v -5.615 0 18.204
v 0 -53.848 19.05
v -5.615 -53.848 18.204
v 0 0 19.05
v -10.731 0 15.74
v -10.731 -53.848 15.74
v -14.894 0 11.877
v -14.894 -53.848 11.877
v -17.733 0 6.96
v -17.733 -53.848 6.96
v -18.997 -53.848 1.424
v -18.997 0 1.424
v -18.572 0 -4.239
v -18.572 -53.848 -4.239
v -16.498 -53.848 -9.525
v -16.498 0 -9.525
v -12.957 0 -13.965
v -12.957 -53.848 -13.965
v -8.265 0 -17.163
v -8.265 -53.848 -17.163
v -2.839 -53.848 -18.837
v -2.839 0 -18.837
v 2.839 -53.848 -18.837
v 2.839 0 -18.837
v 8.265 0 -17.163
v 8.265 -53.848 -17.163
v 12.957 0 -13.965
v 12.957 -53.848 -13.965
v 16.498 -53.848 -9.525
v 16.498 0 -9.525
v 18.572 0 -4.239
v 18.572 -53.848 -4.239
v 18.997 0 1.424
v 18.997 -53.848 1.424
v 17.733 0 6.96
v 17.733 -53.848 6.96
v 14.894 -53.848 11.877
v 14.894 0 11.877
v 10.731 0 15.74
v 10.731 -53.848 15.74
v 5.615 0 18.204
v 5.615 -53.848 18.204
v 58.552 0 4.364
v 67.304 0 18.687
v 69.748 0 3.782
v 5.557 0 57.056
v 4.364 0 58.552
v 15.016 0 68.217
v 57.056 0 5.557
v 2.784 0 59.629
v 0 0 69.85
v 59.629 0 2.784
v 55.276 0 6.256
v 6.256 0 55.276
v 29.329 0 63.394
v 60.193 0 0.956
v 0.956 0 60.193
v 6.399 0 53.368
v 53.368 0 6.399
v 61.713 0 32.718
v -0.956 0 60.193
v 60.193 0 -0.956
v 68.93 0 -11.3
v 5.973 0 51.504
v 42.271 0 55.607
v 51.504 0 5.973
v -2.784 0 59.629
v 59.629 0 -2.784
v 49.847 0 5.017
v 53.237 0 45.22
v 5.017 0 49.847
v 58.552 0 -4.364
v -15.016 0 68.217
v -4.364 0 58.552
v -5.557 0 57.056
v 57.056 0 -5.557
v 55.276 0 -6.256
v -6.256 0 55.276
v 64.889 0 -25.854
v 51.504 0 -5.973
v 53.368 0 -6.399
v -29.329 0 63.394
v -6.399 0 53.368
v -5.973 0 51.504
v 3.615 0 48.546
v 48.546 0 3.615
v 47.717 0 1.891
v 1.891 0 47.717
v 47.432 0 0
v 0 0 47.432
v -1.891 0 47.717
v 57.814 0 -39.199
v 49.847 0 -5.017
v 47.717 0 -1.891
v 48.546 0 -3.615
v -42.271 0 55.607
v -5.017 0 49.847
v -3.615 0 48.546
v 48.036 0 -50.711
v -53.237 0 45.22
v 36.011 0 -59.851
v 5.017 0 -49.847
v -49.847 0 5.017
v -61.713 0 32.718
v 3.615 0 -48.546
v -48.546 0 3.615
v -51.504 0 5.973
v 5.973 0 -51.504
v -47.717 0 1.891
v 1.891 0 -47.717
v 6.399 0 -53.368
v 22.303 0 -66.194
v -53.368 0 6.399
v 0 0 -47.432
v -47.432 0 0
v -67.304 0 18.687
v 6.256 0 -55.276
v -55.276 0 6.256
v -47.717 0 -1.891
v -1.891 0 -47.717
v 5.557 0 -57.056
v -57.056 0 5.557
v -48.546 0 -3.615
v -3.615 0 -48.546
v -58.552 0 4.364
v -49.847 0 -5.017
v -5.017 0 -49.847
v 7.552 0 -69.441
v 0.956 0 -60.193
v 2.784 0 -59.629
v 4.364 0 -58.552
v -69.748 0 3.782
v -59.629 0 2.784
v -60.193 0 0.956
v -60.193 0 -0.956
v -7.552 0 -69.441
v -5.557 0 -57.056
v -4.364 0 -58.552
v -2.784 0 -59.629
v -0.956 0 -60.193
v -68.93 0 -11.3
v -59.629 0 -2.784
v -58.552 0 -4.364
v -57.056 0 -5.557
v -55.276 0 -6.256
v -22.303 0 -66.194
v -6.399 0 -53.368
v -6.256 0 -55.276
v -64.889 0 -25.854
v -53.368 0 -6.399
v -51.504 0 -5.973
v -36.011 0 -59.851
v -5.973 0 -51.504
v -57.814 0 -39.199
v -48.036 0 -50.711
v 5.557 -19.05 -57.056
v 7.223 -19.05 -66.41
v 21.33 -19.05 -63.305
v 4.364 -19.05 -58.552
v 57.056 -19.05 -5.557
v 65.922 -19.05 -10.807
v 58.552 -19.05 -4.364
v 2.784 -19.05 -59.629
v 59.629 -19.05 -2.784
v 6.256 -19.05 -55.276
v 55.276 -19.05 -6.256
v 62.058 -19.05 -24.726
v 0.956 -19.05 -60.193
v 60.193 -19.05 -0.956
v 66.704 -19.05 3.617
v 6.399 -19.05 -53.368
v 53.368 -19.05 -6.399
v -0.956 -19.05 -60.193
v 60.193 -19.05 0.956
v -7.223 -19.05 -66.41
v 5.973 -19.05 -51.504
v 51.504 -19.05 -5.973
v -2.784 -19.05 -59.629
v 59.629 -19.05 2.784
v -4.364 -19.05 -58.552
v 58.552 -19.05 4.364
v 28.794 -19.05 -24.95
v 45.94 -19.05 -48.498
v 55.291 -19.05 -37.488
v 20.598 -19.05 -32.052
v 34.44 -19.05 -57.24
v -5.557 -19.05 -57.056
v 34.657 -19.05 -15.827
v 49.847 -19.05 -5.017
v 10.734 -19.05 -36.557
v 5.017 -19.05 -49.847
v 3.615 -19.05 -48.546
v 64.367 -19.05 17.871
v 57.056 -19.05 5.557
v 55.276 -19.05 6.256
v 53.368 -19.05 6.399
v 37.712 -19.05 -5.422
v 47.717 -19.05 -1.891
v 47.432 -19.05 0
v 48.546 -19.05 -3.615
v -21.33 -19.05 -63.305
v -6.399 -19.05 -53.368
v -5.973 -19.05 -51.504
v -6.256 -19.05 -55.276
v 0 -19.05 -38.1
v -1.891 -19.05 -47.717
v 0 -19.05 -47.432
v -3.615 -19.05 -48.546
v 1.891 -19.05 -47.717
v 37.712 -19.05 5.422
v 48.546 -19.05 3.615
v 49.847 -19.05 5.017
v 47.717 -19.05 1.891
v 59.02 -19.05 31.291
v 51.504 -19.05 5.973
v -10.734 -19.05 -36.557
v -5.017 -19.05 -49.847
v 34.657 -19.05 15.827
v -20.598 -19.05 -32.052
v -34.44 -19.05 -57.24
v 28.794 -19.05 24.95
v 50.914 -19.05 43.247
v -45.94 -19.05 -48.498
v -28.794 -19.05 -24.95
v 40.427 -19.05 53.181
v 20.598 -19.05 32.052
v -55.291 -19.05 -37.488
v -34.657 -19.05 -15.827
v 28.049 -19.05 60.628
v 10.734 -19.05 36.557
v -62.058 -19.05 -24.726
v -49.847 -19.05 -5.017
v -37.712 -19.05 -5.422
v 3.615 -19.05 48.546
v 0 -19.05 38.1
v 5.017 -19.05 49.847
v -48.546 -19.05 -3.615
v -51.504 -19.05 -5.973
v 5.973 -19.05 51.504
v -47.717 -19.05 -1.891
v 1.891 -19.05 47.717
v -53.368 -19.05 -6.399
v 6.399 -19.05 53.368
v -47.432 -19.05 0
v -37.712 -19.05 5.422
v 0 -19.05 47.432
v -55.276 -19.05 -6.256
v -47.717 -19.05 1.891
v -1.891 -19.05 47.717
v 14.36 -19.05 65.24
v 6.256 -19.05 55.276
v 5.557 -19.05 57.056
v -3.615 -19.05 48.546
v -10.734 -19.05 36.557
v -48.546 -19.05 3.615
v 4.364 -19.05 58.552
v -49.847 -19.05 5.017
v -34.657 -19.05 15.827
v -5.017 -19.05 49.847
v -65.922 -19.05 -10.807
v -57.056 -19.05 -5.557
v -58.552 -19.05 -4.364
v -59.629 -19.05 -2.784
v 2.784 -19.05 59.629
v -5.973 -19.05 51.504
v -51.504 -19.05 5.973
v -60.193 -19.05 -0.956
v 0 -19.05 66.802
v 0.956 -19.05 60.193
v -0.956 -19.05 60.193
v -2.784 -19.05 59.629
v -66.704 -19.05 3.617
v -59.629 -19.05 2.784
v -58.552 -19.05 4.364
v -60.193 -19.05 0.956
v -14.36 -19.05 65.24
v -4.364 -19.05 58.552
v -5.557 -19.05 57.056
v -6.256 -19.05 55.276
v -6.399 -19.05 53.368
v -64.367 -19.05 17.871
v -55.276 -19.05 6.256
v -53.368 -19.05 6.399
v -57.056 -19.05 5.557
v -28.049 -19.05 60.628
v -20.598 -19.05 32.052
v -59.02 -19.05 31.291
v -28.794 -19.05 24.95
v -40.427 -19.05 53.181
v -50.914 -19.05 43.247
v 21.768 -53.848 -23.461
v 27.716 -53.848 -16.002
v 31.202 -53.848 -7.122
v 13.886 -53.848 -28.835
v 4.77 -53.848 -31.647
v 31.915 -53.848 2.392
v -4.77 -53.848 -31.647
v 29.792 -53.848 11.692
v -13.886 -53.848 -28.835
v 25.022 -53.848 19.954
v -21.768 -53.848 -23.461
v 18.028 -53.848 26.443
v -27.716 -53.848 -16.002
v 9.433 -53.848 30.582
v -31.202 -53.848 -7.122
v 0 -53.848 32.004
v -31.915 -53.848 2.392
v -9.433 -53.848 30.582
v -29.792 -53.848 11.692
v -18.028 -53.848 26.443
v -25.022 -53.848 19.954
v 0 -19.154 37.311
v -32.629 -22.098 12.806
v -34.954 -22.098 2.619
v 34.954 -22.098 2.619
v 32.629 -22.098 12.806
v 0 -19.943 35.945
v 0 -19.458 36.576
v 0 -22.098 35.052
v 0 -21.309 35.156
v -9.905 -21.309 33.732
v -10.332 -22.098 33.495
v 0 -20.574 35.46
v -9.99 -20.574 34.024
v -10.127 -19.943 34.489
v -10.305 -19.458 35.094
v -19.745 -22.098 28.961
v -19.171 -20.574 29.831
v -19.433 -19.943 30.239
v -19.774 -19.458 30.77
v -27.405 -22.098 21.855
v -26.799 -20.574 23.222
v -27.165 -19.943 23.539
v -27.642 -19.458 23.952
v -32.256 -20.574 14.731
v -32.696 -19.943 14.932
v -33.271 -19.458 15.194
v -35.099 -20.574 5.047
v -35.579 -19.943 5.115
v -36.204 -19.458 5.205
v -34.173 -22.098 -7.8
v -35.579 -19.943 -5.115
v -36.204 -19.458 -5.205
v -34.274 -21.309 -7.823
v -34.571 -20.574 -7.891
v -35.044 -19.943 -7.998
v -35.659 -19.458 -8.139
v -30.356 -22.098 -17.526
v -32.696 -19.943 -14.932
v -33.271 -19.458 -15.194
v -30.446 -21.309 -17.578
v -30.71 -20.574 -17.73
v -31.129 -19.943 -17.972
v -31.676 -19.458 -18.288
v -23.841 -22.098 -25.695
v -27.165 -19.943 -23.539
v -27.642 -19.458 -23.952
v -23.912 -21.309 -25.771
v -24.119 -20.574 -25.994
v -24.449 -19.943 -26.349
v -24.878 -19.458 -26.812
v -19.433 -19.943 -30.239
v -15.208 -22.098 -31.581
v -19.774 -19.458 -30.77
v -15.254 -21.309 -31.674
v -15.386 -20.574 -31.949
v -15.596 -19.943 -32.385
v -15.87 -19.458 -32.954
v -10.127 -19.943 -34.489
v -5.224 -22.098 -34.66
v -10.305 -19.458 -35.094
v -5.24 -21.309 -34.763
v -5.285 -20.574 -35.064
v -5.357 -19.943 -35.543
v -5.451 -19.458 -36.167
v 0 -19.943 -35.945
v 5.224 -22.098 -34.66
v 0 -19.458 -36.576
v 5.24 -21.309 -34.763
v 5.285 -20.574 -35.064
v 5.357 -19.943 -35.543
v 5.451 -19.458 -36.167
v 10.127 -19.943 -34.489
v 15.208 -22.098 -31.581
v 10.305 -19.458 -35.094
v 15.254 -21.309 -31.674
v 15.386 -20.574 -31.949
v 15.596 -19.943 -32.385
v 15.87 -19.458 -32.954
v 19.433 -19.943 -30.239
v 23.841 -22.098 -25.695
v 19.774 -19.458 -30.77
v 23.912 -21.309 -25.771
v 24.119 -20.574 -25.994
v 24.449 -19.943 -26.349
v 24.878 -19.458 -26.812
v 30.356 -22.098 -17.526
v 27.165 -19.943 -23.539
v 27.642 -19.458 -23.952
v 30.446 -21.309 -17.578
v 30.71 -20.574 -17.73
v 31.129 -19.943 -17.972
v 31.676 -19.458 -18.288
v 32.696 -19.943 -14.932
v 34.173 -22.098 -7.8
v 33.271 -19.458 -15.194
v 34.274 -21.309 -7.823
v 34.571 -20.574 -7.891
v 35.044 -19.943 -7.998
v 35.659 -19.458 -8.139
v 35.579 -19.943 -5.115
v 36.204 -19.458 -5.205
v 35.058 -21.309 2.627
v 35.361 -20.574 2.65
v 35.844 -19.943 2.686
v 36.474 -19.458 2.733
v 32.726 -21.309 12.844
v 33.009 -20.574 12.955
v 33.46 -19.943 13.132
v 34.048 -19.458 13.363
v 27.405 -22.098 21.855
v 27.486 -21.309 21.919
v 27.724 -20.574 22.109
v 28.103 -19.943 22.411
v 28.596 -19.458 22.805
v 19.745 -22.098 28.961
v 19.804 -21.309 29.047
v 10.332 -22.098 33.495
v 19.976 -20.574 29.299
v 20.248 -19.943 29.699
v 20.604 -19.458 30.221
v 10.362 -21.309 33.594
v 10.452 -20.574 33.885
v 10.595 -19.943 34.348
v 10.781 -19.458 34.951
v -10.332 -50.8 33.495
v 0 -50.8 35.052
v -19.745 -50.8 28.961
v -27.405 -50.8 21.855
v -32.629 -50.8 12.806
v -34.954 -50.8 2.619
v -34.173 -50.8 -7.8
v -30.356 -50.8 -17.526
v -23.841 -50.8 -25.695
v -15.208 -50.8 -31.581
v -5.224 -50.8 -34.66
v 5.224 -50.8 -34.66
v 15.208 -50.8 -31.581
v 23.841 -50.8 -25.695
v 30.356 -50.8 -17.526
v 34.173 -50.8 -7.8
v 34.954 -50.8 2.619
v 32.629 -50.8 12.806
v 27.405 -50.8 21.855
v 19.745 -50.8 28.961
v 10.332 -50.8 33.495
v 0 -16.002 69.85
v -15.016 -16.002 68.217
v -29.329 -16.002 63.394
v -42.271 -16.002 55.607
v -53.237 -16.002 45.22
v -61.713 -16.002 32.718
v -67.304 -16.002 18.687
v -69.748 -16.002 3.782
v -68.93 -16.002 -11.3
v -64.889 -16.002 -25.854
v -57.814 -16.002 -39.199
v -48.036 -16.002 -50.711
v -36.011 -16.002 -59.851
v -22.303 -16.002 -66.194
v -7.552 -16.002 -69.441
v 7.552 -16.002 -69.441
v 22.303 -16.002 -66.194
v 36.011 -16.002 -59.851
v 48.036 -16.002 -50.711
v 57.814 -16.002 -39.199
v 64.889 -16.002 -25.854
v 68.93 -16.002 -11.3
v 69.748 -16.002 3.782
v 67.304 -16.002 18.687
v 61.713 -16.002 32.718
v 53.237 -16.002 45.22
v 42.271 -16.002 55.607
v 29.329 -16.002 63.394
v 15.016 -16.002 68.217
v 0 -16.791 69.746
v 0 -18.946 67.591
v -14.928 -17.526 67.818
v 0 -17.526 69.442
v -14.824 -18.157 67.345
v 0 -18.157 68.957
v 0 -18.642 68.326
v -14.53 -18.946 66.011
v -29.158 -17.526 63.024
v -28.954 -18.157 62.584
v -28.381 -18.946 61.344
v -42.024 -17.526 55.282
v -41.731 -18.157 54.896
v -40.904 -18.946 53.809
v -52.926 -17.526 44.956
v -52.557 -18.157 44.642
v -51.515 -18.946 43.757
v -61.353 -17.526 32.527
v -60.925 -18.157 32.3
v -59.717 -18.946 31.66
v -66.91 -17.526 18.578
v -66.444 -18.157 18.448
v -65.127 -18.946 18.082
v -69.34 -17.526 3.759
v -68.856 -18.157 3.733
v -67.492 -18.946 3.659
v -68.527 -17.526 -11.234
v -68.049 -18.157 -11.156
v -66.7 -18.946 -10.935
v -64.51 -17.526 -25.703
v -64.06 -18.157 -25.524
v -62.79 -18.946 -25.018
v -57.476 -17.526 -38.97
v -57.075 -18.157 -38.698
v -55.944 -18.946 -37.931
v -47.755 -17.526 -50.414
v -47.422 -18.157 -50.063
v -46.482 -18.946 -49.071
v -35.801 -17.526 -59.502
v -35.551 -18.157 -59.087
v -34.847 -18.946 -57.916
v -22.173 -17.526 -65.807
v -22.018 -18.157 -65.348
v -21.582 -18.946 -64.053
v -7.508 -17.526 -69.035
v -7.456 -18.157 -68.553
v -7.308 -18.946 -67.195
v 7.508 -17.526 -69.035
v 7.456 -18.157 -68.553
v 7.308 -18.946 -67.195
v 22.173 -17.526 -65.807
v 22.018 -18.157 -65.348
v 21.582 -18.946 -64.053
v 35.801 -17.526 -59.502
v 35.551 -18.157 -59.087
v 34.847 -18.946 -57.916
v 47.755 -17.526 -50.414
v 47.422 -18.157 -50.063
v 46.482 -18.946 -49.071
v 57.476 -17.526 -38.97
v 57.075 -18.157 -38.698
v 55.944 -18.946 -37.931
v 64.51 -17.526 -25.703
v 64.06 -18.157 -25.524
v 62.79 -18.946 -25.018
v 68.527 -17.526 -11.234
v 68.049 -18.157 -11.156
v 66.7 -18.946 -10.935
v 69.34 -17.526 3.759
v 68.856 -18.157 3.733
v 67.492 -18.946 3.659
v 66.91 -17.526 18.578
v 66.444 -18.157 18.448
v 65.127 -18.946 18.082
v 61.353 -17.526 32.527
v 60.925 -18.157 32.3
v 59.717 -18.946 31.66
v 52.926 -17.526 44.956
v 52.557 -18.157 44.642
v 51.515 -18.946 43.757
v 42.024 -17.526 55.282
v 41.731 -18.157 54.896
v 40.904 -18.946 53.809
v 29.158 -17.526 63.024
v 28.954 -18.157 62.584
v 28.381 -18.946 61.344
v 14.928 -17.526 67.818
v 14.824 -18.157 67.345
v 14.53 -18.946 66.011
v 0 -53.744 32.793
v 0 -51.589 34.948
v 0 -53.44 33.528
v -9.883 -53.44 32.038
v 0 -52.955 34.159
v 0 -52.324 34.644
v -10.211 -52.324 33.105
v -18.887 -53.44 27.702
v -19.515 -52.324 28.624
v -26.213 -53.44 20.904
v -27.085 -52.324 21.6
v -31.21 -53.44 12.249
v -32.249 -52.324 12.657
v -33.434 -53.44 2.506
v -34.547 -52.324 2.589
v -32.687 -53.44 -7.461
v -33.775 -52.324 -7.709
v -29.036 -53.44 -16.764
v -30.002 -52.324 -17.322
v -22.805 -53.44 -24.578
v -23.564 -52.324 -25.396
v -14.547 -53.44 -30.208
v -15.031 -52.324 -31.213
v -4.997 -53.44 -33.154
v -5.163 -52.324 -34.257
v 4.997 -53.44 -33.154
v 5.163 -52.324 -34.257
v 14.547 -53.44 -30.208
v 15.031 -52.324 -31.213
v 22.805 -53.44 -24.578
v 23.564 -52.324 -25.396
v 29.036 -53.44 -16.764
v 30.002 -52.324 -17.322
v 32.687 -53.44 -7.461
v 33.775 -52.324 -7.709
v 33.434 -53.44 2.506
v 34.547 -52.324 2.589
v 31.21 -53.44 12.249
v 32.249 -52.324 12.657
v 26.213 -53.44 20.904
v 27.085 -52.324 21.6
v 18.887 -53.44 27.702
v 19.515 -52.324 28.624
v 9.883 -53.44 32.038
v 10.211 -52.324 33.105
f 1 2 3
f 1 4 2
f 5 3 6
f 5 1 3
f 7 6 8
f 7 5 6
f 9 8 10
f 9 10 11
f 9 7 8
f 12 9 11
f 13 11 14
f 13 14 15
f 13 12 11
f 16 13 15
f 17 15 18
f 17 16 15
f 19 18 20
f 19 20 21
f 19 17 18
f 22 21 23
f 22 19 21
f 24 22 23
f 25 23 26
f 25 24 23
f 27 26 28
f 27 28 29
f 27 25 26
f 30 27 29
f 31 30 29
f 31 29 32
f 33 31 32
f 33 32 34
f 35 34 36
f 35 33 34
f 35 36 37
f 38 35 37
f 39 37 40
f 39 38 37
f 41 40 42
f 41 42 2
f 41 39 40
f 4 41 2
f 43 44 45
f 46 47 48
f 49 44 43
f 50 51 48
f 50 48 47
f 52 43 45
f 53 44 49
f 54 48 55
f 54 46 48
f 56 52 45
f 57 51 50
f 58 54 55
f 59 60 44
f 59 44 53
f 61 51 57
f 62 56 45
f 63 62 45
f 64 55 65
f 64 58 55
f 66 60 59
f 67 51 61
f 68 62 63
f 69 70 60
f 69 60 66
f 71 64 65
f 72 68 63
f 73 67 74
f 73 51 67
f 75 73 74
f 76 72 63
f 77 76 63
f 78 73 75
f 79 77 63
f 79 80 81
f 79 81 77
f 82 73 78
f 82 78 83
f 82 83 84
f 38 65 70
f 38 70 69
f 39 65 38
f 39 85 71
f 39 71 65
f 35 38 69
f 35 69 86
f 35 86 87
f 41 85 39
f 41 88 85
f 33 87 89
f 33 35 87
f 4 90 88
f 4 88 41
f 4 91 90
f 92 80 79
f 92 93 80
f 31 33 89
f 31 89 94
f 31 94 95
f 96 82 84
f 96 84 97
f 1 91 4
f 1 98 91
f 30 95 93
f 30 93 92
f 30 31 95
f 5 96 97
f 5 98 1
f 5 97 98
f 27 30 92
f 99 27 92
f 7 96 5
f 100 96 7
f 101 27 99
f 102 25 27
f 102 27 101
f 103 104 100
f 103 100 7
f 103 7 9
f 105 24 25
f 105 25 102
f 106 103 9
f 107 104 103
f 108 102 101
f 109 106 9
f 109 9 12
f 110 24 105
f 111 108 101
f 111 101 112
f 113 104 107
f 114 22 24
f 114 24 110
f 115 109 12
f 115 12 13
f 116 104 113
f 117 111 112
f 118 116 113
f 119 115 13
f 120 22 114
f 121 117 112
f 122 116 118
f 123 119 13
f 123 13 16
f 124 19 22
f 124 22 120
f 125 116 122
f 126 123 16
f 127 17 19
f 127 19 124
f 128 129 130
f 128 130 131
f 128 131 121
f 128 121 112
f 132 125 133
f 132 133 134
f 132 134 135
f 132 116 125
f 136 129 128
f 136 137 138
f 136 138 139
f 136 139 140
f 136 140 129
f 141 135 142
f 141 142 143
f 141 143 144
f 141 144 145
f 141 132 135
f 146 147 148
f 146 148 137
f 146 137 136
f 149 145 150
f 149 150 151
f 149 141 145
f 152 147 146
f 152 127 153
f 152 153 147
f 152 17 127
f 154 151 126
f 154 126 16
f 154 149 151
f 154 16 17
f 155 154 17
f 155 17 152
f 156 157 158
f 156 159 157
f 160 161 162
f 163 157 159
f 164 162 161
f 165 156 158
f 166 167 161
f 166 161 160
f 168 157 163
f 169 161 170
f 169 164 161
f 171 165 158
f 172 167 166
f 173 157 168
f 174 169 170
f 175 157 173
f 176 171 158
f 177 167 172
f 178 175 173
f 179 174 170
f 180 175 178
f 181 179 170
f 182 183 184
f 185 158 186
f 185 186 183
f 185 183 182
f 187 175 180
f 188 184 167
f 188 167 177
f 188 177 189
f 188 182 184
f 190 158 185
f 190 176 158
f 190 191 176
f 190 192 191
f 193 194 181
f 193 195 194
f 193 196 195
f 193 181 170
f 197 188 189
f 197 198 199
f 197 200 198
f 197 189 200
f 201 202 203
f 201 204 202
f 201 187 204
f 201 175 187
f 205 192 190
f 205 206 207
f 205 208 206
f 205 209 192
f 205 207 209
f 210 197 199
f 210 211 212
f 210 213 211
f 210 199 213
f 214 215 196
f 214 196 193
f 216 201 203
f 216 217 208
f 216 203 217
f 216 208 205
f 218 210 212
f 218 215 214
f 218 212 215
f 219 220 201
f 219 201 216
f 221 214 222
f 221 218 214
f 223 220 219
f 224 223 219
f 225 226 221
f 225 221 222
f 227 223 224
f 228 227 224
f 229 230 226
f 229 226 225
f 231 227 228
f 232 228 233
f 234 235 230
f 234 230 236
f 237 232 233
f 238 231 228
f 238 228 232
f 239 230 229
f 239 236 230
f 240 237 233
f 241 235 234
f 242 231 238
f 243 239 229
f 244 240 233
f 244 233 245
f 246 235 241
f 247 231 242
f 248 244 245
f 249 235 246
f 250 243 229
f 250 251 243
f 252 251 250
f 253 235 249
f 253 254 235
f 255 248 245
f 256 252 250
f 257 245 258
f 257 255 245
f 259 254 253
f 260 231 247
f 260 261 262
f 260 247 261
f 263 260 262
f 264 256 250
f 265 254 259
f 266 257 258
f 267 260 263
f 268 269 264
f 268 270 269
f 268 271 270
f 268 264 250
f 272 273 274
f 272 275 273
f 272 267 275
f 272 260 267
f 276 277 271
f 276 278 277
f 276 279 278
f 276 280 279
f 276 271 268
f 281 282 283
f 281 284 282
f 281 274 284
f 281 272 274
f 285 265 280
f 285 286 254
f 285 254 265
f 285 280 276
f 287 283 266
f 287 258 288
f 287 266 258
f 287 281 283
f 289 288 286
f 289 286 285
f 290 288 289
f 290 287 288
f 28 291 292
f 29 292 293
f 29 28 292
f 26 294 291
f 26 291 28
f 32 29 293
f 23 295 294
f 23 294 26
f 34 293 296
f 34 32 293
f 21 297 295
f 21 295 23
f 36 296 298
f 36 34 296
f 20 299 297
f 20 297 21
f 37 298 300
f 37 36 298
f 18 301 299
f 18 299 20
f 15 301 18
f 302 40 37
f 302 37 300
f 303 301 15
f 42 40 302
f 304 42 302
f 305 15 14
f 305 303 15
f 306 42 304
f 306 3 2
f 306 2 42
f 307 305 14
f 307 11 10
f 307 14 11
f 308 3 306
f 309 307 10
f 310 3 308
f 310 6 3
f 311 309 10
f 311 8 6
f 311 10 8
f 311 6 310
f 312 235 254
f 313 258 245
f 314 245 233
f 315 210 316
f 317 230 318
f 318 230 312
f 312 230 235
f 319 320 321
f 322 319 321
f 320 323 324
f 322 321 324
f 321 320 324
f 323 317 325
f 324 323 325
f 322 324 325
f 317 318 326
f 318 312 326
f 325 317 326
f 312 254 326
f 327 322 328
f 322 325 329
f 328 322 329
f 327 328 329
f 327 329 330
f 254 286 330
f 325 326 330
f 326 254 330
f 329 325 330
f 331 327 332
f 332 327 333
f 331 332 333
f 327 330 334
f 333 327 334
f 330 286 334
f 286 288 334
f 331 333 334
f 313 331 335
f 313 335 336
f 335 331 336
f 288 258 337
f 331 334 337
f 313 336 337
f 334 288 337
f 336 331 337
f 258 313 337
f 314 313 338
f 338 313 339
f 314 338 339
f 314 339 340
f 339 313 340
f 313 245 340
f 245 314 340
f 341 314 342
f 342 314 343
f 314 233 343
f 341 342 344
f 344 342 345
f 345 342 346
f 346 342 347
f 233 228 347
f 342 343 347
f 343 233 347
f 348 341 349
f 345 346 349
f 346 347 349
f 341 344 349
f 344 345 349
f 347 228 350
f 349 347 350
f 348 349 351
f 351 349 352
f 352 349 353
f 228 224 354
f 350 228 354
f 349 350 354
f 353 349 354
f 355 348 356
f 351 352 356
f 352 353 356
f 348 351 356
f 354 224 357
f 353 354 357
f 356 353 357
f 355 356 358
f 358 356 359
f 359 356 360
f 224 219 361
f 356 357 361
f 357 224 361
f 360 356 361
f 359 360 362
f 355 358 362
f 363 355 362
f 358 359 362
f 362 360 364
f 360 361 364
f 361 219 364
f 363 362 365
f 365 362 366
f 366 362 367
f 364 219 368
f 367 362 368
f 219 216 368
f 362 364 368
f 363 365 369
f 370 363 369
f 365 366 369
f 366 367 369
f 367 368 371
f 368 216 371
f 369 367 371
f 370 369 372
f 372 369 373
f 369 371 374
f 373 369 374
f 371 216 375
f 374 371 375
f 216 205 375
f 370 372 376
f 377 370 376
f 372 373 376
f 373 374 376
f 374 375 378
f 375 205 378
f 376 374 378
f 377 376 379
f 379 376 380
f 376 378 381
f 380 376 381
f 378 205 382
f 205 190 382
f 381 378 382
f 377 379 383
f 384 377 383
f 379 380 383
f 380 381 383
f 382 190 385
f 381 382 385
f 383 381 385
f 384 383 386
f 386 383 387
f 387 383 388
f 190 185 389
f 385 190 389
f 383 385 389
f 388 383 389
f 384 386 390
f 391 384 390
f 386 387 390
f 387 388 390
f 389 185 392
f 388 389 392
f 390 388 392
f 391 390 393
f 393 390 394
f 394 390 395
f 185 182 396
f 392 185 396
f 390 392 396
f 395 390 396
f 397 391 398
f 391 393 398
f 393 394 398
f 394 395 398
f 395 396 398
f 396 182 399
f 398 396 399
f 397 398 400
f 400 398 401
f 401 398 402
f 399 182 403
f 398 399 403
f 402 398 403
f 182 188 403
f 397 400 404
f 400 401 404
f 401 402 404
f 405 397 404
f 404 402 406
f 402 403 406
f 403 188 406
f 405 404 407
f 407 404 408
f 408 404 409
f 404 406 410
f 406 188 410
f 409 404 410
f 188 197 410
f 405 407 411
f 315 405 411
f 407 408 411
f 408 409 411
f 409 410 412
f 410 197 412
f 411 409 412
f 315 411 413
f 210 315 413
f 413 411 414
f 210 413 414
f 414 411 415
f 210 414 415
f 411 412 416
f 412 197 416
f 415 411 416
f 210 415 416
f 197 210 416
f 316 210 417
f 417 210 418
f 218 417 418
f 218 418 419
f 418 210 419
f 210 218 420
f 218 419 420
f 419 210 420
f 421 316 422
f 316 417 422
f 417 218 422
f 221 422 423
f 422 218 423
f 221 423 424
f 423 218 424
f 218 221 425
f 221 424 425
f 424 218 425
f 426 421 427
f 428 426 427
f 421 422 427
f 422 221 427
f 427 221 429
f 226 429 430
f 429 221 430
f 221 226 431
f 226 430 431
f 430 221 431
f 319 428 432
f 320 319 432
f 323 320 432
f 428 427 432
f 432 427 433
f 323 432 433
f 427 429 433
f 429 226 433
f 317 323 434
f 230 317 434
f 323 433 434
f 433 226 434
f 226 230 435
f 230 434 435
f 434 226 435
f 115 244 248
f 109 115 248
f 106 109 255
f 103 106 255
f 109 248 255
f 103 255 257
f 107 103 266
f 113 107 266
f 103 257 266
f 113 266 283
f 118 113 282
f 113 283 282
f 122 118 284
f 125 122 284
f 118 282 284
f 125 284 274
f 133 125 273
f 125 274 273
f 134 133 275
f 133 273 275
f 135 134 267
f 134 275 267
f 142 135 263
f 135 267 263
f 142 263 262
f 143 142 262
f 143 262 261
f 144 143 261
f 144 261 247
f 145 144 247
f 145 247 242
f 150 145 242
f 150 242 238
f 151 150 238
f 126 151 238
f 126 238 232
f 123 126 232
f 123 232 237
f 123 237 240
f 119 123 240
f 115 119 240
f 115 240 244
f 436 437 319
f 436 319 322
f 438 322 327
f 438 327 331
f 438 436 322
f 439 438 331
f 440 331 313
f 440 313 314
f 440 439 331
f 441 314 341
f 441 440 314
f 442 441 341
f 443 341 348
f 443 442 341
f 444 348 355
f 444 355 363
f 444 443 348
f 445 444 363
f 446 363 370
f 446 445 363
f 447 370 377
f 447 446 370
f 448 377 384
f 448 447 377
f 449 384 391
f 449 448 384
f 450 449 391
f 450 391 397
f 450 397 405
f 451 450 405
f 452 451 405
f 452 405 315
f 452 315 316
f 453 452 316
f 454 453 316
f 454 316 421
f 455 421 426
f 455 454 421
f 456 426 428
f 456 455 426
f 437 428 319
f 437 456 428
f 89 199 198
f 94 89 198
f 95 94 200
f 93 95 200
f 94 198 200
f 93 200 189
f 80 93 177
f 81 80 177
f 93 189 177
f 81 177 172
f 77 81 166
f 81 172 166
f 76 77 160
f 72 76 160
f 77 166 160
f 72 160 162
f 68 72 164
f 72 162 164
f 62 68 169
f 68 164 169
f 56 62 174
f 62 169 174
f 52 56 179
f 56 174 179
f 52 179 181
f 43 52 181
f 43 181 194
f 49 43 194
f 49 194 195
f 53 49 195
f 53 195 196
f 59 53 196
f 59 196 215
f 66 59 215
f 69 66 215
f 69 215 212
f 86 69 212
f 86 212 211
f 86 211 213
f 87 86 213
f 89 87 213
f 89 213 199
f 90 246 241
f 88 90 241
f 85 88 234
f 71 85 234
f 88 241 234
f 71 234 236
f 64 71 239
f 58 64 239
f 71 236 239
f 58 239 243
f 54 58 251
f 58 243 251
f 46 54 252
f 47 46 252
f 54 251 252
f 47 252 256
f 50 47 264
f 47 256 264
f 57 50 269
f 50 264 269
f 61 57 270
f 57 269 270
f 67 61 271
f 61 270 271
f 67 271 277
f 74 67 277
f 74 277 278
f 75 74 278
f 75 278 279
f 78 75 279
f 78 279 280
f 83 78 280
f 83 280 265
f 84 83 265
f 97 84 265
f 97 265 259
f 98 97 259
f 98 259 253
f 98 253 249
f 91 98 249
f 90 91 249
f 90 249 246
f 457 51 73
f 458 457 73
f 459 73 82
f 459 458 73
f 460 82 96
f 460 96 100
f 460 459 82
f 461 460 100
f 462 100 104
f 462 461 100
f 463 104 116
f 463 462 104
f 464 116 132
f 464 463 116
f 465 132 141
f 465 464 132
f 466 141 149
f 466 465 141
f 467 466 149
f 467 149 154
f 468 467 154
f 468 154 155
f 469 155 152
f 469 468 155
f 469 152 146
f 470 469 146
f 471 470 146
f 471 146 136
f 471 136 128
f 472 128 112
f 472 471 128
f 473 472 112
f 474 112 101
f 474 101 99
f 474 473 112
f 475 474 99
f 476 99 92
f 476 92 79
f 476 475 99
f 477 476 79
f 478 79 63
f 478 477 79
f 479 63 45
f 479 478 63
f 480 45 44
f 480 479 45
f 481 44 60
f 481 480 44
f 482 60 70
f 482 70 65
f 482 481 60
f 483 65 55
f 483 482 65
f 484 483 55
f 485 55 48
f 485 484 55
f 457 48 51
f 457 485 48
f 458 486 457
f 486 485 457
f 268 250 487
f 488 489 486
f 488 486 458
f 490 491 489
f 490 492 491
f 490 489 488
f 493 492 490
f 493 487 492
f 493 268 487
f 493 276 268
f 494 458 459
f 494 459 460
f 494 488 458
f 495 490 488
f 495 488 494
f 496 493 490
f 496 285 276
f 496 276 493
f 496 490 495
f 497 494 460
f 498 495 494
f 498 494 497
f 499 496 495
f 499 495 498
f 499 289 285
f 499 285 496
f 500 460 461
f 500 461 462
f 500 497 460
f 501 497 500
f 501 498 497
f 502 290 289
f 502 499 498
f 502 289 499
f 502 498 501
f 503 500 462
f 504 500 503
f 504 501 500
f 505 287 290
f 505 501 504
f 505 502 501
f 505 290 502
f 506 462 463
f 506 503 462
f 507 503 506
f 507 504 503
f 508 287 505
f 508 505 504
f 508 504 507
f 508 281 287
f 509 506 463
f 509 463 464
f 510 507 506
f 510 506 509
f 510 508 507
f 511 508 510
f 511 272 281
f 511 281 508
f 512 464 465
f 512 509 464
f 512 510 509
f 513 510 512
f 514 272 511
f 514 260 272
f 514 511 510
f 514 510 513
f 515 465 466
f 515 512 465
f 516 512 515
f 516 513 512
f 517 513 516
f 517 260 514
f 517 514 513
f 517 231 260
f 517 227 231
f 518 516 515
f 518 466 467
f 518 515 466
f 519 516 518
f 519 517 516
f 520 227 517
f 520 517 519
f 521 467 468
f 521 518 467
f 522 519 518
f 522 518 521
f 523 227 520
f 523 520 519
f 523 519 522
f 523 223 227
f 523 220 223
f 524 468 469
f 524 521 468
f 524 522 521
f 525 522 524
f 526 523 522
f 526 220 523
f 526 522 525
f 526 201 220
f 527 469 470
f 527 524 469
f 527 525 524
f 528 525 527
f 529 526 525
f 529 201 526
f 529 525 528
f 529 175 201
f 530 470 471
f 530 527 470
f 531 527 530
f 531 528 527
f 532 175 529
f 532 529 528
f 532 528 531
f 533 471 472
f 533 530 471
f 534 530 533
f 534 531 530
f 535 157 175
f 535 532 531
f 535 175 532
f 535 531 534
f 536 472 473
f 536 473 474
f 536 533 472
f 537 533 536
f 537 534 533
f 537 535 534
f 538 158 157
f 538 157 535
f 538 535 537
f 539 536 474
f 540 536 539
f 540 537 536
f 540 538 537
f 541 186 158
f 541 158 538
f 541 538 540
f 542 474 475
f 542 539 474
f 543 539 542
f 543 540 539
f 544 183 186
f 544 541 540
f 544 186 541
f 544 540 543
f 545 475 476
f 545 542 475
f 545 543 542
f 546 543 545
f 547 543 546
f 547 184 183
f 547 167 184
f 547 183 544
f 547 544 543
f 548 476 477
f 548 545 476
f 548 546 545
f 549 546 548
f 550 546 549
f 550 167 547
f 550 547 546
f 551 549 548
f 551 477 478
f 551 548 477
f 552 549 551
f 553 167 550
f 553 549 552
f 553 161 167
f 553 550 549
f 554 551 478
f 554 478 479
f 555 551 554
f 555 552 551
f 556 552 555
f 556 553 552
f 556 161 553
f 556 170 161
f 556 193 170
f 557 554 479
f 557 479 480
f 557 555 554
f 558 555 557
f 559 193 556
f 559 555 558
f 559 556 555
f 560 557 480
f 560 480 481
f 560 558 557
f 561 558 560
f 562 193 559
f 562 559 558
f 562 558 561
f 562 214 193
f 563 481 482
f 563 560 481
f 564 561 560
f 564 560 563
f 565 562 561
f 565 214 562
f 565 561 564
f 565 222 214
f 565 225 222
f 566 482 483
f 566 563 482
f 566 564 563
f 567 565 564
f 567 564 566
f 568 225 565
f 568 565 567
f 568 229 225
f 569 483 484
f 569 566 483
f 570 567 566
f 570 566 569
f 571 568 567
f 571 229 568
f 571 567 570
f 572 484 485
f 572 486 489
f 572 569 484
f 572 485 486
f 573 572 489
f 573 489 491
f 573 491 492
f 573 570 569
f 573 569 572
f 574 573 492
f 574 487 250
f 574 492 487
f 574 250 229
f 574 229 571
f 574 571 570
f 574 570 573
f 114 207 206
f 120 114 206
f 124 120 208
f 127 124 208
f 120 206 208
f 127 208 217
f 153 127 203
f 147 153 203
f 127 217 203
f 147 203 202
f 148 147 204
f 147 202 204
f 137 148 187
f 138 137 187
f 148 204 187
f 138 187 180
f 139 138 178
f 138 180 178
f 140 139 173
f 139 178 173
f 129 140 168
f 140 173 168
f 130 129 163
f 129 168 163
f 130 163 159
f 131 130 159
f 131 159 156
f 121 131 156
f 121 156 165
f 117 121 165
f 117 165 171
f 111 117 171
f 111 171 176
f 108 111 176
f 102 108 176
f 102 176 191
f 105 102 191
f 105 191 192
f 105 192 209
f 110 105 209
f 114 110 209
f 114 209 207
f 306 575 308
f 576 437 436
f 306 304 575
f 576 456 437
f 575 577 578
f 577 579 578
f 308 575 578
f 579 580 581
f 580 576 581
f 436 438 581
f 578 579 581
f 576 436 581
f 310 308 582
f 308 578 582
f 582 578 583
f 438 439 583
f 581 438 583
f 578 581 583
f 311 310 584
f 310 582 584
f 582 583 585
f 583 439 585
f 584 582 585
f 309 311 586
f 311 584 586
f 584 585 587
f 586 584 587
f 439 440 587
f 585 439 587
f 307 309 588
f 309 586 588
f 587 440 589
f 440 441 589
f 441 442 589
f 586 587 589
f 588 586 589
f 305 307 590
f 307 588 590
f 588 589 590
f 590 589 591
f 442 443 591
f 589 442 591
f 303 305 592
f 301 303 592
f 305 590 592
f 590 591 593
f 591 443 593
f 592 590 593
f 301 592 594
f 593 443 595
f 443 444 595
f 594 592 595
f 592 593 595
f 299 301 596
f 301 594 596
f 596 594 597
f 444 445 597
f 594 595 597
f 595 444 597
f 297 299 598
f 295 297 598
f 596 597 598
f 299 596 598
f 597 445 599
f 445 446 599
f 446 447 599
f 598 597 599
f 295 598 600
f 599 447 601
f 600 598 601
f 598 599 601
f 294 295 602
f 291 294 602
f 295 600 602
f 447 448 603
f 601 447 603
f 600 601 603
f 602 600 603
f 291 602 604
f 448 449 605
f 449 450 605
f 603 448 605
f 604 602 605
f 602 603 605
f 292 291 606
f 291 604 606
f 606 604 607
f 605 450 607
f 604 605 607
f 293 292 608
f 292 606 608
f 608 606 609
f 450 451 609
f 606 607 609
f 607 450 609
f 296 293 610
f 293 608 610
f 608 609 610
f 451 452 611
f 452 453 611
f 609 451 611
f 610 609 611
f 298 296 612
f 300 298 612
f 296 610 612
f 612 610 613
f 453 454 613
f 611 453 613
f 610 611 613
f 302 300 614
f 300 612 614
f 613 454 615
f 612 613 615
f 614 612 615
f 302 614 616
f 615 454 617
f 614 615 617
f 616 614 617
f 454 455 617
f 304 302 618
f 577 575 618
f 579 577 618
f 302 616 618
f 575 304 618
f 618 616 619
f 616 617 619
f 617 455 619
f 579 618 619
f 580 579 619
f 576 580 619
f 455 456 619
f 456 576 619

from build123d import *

# Parameters (mm, degrees)
F2_R            = 6.4164417579
F3_DEPTH        = 19.051
F3_COPIES_COUNT = 4
F4_R            = 3.048


# Not quite as in the source:
# - a pattern or mirror of a feature is missing from the dataset's text; its kind, count and spacing are read off the source's solid


with BuildPart() as f1:
    # F0 (on Right) → F1 (revolve)
    with BuildSketch(Plane.YZ):
        Polygon((-53.848, 19.05), (0, 19.05), (0, 69.85), (-19.05, 69.85), (-19.05, 35.052), (-53.848, 35.052), align=None)
    revolve(axis=Axis((0, -58.1718310714, 0), (0, -1, 0)))

    # F2 (on face) → F3 (cut, through all)
    with BuildSketch(Plane.XZ.offset(19.05)):
        with Locations((-53.848, 0)):
            Circle(F2_R)
    f3 = extrude(amount=-F3_DEPTH, mode=Mode.SUBTRACT)

    # F3_copies: F3 ×4 about axis
    f3_copies_axis = Axis((0, 0, 0), (0, 1, 0))
    for i in range(1, F3_COPIES_COUNT):
        add(f3.rotate(f3_copies_axis, i * 360 / F3_COPIES_COUNT), mode=Mode.SUBTRACT)

    # F4
    f4_edges = [f1.edges().sort_by_distance(p)[0] for p in [
        (0, -53.848, -35.052),
        (0, -19.05, -35.052),
        (0, -19.05, -69.85),
    ]]
    fillet(f4_edges, radius=F4_R)


solid = f1.part
